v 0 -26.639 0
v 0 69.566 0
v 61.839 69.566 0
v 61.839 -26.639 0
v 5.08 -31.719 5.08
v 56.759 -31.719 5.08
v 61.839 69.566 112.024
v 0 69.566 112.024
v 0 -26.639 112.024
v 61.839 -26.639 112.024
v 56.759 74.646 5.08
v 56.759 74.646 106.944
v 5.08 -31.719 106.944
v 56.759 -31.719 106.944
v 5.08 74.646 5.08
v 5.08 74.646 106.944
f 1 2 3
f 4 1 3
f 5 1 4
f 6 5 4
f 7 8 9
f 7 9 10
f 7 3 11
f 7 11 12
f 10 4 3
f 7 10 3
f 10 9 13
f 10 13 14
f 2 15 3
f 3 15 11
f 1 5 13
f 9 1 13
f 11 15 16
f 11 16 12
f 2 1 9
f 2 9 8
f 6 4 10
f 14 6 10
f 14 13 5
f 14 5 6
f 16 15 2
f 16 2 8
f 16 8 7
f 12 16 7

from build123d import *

# Parameters (mm, degrees)
F0_W     = 61.83859
F0_H     = 106.365577
F1_DEPTH = 112.024114
F2_SIZE  = 5.08
F3_SIZE  = 5.08


with BuildPart() as f1:
    # F0 (on Top) → F1 (new body)
    with BuildSketch(Plane.XY):
        with Locations((30.919295, 21.463483)):
            Rectangle(F0_W, F0_H)
    extrude(amount=F1_DEPTH)

    # F2
    f2_edges = [f1.edges().sort_by_distance(p)[0] for p in [
        (0, -31.719305, 56.012057),
        (61.83859, -31.719305, 56.012057),
        (30.919295, -31.719305, 0),
        (30.919295, -31.719305, 112.024114),
    ]]
    chamfer(f2_edges, length=F2_SIZE)

    # F3
    f3_edges = [f1.edges().sort_by_distance(p)[0] for p in [
        (61.83859, 74.646272, 56.012057),
        (0, 74.646272, 56.012057),
        (30.919295, 74.646272, 0),
        (30.919295, 74.646272, 112.024114),
    ]]
    chamfer(f3_edges, length=F3_SIZE)


solid = f1.part
